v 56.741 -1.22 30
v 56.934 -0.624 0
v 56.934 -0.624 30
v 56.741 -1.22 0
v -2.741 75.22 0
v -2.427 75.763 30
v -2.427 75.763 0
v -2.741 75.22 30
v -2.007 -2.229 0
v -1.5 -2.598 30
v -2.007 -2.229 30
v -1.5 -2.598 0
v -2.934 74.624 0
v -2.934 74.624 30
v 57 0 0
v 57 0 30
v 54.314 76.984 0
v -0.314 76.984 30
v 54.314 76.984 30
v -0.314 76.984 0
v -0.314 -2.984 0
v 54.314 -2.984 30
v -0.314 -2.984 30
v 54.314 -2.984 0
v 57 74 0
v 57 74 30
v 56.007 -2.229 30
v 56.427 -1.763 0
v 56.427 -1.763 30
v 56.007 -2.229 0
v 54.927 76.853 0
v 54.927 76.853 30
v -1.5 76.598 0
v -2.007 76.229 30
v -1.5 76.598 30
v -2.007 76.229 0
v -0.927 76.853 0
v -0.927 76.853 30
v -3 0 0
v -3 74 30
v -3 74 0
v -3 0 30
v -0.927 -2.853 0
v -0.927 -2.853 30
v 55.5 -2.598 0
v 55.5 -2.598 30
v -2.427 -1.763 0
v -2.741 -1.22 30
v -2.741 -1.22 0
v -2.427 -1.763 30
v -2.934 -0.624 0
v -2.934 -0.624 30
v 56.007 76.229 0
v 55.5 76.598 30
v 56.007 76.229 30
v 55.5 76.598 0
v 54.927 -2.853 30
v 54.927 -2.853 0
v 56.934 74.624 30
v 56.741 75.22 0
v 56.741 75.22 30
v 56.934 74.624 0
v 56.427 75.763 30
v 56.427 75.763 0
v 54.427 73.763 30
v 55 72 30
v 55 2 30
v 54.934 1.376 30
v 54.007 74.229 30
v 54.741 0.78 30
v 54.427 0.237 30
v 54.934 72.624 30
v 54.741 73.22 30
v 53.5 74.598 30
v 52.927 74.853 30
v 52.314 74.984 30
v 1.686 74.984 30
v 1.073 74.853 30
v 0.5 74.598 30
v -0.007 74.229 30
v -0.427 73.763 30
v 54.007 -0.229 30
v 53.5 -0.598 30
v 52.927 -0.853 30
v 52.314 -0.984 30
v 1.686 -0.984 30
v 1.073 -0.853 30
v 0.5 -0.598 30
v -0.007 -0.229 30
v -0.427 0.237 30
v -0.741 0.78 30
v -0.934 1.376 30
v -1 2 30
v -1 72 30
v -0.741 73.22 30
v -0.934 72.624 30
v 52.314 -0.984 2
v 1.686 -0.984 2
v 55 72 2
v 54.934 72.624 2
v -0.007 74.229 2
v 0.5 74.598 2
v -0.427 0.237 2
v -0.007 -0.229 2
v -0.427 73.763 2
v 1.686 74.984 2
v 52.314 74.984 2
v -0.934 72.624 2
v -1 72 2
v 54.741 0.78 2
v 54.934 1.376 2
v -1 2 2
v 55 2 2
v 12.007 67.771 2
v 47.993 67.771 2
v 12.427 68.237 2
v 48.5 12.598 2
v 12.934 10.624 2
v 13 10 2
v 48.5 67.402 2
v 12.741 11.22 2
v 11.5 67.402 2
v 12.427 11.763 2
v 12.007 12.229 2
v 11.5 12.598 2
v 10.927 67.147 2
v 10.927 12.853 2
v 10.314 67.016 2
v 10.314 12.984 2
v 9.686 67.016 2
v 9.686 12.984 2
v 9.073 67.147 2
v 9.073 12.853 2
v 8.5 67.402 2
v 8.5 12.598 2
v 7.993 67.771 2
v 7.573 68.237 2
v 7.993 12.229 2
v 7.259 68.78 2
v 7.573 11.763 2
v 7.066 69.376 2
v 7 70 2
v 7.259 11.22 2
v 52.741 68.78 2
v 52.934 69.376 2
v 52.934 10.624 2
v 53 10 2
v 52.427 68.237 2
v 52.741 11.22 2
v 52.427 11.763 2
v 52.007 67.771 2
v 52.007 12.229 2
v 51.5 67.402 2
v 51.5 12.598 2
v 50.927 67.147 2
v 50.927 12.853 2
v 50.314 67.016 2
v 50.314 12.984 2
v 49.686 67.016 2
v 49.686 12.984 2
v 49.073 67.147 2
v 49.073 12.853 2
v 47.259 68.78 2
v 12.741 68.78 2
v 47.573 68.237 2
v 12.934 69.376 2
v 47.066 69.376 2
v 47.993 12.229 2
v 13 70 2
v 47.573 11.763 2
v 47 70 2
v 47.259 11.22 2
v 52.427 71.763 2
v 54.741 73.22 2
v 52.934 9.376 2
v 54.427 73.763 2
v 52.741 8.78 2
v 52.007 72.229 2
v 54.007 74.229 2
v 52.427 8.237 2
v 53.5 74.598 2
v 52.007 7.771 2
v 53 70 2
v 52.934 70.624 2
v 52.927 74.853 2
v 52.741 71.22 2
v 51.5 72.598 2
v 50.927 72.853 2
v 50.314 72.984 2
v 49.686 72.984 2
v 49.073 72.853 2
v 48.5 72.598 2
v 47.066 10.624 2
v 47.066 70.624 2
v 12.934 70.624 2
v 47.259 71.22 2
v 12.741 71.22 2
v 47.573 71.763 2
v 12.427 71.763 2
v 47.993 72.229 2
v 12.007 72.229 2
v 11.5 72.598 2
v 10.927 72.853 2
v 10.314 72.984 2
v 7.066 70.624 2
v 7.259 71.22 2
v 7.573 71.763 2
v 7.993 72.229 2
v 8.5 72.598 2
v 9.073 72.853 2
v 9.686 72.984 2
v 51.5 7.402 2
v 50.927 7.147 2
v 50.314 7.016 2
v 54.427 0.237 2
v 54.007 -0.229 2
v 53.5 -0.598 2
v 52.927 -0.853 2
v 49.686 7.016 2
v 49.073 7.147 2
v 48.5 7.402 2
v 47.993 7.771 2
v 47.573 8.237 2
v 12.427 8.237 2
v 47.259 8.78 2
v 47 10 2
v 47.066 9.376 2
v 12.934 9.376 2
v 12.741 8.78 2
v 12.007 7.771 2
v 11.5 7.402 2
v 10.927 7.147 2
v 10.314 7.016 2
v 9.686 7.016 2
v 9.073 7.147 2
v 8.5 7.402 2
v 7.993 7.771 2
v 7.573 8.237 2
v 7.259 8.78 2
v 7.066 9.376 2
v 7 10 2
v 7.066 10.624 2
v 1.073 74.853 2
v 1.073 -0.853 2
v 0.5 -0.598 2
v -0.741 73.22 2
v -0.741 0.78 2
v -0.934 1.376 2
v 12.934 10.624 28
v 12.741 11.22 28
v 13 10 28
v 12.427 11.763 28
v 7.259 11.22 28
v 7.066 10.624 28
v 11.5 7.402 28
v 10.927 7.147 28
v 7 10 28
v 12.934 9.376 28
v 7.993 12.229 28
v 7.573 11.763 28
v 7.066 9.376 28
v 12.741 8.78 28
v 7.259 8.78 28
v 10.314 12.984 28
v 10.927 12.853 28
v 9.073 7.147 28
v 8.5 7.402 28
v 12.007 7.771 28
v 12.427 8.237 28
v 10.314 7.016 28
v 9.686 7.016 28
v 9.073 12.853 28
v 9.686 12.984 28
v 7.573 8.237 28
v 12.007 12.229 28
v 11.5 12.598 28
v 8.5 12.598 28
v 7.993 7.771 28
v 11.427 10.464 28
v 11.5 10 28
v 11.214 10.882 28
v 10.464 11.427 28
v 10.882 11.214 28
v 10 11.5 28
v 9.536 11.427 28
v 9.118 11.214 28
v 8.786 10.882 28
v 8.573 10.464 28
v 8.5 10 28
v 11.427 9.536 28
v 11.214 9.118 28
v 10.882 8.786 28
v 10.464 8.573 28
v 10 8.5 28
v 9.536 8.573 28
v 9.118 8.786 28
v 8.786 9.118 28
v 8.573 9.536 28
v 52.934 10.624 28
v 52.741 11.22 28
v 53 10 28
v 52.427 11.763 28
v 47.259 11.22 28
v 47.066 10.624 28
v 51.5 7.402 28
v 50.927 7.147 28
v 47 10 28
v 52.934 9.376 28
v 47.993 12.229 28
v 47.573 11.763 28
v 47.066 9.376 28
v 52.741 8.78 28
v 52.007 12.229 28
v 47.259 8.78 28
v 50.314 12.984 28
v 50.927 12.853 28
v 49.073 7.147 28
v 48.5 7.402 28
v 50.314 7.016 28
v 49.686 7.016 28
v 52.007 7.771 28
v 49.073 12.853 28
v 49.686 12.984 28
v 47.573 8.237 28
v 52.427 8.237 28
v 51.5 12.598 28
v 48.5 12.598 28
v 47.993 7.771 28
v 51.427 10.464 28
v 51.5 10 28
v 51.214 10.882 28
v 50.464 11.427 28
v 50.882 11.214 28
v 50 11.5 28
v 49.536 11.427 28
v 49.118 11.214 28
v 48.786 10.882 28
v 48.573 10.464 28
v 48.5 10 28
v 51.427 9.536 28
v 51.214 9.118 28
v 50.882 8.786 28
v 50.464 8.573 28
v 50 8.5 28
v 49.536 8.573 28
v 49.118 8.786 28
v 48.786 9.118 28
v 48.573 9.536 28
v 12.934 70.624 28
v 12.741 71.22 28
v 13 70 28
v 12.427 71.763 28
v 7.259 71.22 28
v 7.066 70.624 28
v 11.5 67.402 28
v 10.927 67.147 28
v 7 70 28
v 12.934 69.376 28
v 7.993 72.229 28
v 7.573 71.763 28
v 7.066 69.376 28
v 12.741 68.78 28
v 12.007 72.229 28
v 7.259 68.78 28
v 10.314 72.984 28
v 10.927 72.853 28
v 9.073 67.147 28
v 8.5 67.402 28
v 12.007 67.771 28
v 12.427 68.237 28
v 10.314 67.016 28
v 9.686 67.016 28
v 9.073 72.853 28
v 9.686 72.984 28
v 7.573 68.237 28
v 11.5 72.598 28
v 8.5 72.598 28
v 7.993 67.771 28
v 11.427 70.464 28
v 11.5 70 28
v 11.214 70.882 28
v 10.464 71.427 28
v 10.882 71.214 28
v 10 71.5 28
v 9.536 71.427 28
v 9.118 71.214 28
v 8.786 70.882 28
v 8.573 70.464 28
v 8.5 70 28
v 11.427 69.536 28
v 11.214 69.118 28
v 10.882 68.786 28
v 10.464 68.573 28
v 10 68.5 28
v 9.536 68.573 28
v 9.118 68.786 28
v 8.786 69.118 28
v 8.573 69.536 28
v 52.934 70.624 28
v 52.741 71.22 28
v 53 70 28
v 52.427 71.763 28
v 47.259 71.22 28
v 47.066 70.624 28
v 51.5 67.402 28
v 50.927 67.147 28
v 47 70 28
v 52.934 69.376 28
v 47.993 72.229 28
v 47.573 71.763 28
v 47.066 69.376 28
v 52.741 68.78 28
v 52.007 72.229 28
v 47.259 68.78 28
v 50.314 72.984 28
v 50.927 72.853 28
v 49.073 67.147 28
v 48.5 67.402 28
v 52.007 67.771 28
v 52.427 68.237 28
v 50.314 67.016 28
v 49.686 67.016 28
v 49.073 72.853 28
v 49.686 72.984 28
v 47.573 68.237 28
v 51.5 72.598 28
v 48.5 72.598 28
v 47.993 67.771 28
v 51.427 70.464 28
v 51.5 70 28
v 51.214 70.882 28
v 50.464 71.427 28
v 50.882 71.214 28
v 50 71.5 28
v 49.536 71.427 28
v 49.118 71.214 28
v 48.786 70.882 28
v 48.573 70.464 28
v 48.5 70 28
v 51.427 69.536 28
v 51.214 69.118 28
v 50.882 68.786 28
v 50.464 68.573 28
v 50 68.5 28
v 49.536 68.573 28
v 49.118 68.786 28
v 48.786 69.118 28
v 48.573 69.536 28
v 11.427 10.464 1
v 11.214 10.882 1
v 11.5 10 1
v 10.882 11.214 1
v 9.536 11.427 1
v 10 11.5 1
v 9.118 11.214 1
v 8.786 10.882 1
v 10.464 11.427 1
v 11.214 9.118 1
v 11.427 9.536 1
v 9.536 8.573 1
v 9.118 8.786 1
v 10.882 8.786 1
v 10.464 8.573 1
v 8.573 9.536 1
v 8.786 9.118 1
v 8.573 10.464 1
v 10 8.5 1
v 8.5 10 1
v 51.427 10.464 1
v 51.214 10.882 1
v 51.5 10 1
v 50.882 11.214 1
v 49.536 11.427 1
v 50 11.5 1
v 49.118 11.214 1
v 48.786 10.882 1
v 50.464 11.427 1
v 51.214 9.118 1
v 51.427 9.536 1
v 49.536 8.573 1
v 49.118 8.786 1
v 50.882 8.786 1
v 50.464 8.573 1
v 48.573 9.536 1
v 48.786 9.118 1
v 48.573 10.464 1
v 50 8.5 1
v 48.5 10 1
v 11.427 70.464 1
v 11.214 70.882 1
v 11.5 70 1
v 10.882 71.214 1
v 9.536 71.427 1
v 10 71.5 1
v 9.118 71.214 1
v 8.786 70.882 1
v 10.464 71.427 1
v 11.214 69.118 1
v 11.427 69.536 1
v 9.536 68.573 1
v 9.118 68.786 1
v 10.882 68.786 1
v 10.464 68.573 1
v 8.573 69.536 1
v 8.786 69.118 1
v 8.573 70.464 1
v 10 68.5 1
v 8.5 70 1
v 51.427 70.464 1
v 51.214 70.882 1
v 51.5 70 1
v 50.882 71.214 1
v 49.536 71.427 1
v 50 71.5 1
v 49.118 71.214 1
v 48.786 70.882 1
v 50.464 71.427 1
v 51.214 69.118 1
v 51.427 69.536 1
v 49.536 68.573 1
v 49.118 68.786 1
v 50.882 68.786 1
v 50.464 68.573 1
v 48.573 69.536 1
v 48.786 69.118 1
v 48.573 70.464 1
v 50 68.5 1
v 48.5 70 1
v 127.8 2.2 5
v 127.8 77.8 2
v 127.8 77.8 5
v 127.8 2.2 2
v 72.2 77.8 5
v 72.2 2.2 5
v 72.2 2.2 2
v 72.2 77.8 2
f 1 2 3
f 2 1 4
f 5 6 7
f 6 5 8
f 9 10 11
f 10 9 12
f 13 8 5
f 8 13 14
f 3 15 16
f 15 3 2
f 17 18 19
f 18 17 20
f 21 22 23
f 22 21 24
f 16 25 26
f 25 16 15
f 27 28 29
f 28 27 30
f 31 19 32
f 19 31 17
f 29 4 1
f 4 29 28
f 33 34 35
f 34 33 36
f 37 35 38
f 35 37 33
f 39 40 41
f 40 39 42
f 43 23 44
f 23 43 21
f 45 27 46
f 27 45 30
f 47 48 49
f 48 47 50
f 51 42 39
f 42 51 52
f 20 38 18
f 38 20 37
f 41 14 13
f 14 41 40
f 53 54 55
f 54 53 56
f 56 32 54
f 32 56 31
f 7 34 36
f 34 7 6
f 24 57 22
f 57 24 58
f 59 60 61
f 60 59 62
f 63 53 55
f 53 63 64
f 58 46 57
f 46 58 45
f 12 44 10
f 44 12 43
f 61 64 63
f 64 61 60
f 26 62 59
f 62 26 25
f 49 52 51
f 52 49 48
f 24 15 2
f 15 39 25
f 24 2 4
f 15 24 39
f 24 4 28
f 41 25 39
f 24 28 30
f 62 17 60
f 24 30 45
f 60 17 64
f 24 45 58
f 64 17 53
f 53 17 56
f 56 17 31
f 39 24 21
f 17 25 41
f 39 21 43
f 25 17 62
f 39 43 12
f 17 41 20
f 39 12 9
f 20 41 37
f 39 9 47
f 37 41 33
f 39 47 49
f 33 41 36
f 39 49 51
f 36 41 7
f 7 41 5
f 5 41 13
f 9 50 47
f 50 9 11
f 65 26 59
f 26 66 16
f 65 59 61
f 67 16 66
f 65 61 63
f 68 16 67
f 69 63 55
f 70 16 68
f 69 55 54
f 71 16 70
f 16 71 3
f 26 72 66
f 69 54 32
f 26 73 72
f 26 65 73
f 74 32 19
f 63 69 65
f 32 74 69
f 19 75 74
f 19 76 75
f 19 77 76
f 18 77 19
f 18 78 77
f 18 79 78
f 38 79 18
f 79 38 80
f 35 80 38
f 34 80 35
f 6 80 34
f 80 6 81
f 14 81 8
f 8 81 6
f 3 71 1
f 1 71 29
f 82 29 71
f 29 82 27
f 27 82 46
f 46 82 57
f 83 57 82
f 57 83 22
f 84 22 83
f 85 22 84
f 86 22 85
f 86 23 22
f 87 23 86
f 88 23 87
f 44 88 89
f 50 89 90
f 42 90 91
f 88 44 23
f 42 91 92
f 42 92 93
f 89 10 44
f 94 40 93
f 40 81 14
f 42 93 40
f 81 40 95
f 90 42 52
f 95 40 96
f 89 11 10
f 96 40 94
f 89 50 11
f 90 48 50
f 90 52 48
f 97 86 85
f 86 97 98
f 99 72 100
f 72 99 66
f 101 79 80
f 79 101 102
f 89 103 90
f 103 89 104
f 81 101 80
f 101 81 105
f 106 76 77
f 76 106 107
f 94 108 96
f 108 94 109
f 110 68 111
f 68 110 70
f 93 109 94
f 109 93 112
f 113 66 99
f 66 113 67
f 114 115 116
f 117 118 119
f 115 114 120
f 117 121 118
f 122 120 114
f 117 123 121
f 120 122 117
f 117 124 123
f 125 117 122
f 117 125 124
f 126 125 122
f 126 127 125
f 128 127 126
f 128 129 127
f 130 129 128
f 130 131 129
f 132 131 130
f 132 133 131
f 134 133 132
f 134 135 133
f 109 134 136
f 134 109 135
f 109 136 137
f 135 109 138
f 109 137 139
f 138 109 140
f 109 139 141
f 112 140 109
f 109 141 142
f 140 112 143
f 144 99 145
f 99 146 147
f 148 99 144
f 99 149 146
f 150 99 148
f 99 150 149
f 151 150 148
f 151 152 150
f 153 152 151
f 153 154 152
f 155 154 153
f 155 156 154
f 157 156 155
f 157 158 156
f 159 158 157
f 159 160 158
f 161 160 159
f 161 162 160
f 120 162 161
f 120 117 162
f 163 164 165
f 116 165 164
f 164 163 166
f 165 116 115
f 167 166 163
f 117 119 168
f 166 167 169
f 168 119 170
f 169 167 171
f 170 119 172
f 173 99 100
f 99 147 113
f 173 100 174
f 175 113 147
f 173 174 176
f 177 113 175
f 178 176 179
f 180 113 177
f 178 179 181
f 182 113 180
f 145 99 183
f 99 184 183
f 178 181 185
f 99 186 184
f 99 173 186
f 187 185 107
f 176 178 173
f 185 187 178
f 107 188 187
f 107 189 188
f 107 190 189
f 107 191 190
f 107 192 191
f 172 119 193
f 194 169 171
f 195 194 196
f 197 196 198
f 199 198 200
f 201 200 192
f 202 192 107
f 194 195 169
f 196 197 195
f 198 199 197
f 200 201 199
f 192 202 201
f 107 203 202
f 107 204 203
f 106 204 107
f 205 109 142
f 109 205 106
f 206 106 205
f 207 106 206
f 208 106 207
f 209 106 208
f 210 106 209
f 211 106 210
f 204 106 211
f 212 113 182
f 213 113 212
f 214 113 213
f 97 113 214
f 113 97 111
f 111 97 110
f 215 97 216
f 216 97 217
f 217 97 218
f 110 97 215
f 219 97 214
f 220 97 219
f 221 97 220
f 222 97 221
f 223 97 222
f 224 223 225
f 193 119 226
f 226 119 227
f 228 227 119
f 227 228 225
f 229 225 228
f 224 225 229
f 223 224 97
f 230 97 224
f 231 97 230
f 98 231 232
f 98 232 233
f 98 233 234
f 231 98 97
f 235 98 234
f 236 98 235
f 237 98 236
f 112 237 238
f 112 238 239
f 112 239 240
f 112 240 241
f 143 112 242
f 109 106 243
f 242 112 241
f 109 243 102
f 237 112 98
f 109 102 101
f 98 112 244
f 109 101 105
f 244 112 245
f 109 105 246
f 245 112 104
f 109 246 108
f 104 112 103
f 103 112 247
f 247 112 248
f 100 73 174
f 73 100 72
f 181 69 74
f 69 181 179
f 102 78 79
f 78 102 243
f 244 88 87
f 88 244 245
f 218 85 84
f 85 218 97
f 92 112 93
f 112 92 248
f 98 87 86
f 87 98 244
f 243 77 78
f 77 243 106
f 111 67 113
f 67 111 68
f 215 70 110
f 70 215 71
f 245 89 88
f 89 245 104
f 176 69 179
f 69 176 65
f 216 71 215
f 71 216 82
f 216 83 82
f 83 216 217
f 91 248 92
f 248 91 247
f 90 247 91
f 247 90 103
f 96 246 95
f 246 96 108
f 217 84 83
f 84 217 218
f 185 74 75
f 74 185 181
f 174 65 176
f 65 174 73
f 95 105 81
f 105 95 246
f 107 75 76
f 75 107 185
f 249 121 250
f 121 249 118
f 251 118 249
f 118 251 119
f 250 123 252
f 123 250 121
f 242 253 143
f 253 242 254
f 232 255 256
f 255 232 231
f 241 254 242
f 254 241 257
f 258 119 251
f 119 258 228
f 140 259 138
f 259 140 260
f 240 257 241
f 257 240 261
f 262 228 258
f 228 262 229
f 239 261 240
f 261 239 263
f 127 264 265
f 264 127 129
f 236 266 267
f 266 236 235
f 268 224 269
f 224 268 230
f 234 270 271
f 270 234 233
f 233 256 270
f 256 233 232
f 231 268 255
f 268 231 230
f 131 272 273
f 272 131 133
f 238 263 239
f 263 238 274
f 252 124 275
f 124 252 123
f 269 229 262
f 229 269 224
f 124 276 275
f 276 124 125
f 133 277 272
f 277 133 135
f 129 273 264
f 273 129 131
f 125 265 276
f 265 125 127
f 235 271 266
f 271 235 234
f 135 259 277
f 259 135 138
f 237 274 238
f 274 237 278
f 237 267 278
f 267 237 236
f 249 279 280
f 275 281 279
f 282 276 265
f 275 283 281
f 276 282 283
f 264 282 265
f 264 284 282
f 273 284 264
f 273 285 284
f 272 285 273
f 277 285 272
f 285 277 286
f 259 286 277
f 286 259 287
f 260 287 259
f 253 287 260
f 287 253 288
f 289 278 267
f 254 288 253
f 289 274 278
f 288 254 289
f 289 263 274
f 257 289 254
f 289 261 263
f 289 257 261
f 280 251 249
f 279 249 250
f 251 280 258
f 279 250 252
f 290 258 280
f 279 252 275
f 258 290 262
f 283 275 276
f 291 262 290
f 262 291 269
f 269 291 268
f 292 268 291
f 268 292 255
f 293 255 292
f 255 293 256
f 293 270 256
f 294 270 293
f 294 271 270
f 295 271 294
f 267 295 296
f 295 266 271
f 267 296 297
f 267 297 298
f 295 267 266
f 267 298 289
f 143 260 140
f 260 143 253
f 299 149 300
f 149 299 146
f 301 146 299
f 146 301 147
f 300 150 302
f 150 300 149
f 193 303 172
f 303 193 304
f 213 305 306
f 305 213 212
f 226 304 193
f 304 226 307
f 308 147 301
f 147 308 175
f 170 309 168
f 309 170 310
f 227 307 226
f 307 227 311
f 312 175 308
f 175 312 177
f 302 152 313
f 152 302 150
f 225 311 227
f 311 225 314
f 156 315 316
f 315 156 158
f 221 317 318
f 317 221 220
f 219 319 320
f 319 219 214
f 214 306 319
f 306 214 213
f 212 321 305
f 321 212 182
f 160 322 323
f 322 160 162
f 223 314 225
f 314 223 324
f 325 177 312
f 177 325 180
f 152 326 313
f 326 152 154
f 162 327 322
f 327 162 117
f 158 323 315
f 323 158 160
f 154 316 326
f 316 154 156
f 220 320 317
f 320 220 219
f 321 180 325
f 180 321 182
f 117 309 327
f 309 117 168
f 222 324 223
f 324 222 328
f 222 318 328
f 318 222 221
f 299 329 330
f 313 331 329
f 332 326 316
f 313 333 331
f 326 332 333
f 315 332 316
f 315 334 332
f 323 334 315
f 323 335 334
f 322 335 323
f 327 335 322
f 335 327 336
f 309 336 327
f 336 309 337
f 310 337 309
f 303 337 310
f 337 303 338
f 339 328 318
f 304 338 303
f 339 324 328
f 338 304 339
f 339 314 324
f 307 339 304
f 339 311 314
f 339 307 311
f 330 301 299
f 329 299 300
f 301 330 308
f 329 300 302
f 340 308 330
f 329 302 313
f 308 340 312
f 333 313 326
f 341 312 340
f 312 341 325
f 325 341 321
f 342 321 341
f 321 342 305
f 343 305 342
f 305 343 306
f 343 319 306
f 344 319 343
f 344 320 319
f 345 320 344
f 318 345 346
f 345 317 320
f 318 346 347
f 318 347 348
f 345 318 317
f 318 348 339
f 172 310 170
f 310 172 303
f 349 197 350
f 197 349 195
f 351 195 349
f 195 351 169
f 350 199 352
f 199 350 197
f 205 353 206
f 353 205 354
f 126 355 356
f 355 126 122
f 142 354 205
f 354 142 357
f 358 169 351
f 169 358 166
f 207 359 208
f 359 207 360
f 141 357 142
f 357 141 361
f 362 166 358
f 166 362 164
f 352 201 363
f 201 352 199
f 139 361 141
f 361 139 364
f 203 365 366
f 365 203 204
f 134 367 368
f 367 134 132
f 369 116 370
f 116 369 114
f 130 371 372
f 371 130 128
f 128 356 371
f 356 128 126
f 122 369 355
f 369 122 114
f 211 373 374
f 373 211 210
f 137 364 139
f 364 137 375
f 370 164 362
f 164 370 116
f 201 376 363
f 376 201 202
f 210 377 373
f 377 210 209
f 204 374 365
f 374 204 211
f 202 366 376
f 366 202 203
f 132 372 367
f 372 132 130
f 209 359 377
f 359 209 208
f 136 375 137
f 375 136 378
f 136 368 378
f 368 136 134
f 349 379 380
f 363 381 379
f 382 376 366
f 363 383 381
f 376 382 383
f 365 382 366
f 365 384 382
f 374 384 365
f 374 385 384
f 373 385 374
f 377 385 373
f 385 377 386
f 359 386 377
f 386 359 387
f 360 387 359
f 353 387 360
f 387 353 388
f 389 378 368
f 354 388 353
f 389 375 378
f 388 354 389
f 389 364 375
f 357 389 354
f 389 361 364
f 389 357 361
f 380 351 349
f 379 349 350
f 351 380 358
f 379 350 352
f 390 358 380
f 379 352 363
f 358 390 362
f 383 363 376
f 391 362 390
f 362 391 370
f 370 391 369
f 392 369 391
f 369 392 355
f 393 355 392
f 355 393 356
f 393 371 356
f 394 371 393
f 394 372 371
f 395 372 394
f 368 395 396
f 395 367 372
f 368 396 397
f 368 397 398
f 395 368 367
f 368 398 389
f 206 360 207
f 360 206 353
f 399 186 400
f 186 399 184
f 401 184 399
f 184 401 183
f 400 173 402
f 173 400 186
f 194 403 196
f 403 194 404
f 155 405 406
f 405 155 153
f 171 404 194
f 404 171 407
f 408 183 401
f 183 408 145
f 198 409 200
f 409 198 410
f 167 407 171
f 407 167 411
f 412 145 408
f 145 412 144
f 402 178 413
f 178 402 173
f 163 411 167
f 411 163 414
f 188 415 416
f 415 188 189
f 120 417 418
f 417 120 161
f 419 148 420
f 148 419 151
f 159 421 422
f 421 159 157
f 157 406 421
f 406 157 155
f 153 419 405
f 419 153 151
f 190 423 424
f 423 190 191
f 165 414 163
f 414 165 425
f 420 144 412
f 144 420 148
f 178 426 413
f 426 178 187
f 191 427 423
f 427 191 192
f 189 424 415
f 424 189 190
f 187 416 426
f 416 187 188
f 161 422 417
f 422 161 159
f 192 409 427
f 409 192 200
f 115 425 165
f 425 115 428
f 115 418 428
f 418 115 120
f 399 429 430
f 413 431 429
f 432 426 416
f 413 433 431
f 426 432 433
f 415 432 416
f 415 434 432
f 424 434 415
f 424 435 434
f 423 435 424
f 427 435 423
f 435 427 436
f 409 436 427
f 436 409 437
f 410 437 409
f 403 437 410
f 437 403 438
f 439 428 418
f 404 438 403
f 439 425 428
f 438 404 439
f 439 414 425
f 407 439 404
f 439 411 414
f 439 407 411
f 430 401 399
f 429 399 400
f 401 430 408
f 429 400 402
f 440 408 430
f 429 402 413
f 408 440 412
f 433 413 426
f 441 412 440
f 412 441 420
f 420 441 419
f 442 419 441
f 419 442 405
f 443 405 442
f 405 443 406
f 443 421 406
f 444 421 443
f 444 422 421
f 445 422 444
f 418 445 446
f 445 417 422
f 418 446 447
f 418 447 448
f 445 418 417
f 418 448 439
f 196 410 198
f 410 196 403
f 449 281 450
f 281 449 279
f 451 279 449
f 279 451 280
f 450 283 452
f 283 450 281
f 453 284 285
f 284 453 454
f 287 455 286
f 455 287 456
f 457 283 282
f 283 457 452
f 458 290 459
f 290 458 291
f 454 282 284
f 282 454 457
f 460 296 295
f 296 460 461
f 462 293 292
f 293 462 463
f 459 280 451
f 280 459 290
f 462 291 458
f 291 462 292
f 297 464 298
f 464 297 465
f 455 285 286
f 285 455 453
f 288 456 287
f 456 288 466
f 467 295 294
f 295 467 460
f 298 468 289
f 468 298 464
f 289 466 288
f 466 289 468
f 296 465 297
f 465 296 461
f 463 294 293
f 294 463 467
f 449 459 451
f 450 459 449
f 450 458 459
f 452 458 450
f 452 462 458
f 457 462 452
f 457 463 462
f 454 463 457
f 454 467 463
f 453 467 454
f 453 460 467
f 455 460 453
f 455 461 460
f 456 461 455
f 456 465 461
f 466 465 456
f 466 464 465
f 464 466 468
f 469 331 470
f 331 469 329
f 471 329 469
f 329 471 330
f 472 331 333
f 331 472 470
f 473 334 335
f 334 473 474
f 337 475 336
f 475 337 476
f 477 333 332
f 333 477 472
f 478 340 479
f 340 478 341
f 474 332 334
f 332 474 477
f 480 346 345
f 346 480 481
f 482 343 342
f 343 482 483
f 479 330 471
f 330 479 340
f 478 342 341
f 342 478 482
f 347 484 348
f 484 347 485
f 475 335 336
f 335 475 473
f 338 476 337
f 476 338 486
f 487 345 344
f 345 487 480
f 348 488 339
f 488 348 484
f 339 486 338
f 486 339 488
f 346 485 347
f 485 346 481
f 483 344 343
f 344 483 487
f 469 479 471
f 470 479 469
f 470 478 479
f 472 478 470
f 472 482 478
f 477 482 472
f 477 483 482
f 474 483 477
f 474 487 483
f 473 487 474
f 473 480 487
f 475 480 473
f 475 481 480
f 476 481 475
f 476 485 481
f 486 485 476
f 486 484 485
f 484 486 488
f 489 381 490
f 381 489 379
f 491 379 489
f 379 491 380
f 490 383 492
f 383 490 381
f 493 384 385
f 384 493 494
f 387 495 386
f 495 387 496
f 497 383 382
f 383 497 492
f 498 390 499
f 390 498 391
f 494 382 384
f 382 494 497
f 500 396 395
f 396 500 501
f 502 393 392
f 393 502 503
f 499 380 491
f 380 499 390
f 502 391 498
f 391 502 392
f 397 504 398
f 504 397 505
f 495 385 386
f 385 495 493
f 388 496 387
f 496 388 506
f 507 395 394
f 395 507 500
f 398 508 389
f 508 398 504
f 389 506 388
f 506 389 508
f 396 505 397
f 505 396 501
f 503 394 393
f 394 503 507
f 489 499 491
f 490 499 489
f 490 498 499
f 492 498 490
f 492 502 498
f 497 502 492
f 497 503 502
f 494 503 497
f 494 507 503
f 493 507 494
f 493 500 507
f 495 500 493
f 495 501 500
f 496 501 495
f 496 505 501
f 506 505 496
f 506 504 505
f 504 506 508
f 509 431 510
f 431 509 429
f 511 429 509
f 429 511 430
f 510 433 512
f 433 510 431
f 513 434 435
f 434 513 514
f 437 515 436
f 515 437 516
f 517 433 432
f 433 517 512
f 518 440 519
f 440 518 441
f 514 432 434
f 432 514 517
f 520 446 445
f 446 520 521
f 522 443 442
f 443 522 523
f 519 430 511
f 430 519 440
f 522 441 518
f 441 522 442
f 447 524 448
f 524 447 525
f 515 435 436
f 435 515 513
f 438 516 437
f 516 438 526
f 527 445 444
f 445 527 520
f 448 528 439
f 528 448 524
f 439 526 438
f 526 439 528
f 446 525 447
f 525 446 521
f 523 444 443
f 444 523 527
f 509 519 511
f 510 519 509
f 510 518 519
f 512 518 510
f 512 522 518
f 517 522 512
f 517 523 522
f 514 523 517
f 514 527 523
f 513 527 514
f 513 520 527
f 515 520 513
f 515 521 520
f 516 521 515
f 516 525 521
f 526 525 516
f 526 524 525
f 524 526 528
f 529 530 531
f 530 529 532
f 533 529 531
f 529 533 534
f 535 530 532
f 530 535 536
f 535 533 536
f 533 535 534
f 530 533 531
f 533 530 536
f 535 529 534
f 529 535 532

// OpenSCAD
// Parametric Enclosure Box with Lid
// Adjustable for electronics projects

// Box Parameters
box_width = 60;
box_length = 80;
box_height = 30;
wall_thickness = 2;
corner_radius = 3;
lid_clearance = 0.2;  // Gap for lid fit
lip_height = 3;       // Depth of lid lip

// Mounting bosses
boss_diameter = 6;
boss_height = box_height - wall_thickness - 2;
screw_hole_diameter = 3;

module rounded_box(size, radius, thickness) {
    difference() {
        // Outer shell
        minkowski() {
            cube([size[0] - 2*radius, size[1] - 2*radius, size[2]/2]);
            cylinder(r=radius, h=size[2]/2, $fn=30);
        }
        
        // Inner cavity
        translate([thickness, thickness, thickness])
            minkowski() {
                cube([size[0] - 2*radius - 2*thickness, 
                      size[1] - 2*radius - 2*thickness, 
                      size[2]/2]);
                cylinder(r=radius, h=size[2]/2, $fn=30);
            }
    }
}

module enclosure_base() {
    difference() {
        union() {
            // Main box
            rounded_box([box_width, box_length, box_height], corner_radius, wall_thickness);
            
            // Mounting bosses
            boss_positions = [
                [10, 10],
                [box_width - 10, 10],
                [10, box_length - 10],
                [box_width - 10, box_length - 10]
            ];
            
            for (pos = boss_positions) {
                translate([pos[0], pos[1], wall_thickness])
                    cylinder(d=boss_diameter, h=boss_height, $fn=30);
            }
        }
        
        // Screw holes in bosses
        boss_positions = [
            [10, 10],
            [box_width - 10, 10],
            [10, box_length - 10],
            [box_width - 10, box_length - 10]
        ];
        
        for (pos = boss_positions) {
            translate([pos[0], pos[1], wall_thickness - 1])
                cylinder(d=screw_hole_diameter, h=boss_height + 2, $fn=20);
        }
    }
}

module enclosure_lid() {
    union() {
        // Lid top plate
        rounded_box([box_width, box_length, wall_thickness + 1], corner_radius, 0);
        
        // Lid lip (fits inside box)
        translate([wall_thickness + lid_clearance, 
                   wall_thickness + lid_clearance, 
                   wall_thickness])
            cube([box_width - 2*wall_thickness - 2*lid_clearance,
                  box_length - 2*wall_thickness - 2*lid_clearance,
                  lip_height]);
    }
}

// Generate parts
// Uncomment one at a time for export

enclosure_base();

// Lid positioned next to base for export
translate([box_width + 10, 0, 0])
    enclosure_lid();
